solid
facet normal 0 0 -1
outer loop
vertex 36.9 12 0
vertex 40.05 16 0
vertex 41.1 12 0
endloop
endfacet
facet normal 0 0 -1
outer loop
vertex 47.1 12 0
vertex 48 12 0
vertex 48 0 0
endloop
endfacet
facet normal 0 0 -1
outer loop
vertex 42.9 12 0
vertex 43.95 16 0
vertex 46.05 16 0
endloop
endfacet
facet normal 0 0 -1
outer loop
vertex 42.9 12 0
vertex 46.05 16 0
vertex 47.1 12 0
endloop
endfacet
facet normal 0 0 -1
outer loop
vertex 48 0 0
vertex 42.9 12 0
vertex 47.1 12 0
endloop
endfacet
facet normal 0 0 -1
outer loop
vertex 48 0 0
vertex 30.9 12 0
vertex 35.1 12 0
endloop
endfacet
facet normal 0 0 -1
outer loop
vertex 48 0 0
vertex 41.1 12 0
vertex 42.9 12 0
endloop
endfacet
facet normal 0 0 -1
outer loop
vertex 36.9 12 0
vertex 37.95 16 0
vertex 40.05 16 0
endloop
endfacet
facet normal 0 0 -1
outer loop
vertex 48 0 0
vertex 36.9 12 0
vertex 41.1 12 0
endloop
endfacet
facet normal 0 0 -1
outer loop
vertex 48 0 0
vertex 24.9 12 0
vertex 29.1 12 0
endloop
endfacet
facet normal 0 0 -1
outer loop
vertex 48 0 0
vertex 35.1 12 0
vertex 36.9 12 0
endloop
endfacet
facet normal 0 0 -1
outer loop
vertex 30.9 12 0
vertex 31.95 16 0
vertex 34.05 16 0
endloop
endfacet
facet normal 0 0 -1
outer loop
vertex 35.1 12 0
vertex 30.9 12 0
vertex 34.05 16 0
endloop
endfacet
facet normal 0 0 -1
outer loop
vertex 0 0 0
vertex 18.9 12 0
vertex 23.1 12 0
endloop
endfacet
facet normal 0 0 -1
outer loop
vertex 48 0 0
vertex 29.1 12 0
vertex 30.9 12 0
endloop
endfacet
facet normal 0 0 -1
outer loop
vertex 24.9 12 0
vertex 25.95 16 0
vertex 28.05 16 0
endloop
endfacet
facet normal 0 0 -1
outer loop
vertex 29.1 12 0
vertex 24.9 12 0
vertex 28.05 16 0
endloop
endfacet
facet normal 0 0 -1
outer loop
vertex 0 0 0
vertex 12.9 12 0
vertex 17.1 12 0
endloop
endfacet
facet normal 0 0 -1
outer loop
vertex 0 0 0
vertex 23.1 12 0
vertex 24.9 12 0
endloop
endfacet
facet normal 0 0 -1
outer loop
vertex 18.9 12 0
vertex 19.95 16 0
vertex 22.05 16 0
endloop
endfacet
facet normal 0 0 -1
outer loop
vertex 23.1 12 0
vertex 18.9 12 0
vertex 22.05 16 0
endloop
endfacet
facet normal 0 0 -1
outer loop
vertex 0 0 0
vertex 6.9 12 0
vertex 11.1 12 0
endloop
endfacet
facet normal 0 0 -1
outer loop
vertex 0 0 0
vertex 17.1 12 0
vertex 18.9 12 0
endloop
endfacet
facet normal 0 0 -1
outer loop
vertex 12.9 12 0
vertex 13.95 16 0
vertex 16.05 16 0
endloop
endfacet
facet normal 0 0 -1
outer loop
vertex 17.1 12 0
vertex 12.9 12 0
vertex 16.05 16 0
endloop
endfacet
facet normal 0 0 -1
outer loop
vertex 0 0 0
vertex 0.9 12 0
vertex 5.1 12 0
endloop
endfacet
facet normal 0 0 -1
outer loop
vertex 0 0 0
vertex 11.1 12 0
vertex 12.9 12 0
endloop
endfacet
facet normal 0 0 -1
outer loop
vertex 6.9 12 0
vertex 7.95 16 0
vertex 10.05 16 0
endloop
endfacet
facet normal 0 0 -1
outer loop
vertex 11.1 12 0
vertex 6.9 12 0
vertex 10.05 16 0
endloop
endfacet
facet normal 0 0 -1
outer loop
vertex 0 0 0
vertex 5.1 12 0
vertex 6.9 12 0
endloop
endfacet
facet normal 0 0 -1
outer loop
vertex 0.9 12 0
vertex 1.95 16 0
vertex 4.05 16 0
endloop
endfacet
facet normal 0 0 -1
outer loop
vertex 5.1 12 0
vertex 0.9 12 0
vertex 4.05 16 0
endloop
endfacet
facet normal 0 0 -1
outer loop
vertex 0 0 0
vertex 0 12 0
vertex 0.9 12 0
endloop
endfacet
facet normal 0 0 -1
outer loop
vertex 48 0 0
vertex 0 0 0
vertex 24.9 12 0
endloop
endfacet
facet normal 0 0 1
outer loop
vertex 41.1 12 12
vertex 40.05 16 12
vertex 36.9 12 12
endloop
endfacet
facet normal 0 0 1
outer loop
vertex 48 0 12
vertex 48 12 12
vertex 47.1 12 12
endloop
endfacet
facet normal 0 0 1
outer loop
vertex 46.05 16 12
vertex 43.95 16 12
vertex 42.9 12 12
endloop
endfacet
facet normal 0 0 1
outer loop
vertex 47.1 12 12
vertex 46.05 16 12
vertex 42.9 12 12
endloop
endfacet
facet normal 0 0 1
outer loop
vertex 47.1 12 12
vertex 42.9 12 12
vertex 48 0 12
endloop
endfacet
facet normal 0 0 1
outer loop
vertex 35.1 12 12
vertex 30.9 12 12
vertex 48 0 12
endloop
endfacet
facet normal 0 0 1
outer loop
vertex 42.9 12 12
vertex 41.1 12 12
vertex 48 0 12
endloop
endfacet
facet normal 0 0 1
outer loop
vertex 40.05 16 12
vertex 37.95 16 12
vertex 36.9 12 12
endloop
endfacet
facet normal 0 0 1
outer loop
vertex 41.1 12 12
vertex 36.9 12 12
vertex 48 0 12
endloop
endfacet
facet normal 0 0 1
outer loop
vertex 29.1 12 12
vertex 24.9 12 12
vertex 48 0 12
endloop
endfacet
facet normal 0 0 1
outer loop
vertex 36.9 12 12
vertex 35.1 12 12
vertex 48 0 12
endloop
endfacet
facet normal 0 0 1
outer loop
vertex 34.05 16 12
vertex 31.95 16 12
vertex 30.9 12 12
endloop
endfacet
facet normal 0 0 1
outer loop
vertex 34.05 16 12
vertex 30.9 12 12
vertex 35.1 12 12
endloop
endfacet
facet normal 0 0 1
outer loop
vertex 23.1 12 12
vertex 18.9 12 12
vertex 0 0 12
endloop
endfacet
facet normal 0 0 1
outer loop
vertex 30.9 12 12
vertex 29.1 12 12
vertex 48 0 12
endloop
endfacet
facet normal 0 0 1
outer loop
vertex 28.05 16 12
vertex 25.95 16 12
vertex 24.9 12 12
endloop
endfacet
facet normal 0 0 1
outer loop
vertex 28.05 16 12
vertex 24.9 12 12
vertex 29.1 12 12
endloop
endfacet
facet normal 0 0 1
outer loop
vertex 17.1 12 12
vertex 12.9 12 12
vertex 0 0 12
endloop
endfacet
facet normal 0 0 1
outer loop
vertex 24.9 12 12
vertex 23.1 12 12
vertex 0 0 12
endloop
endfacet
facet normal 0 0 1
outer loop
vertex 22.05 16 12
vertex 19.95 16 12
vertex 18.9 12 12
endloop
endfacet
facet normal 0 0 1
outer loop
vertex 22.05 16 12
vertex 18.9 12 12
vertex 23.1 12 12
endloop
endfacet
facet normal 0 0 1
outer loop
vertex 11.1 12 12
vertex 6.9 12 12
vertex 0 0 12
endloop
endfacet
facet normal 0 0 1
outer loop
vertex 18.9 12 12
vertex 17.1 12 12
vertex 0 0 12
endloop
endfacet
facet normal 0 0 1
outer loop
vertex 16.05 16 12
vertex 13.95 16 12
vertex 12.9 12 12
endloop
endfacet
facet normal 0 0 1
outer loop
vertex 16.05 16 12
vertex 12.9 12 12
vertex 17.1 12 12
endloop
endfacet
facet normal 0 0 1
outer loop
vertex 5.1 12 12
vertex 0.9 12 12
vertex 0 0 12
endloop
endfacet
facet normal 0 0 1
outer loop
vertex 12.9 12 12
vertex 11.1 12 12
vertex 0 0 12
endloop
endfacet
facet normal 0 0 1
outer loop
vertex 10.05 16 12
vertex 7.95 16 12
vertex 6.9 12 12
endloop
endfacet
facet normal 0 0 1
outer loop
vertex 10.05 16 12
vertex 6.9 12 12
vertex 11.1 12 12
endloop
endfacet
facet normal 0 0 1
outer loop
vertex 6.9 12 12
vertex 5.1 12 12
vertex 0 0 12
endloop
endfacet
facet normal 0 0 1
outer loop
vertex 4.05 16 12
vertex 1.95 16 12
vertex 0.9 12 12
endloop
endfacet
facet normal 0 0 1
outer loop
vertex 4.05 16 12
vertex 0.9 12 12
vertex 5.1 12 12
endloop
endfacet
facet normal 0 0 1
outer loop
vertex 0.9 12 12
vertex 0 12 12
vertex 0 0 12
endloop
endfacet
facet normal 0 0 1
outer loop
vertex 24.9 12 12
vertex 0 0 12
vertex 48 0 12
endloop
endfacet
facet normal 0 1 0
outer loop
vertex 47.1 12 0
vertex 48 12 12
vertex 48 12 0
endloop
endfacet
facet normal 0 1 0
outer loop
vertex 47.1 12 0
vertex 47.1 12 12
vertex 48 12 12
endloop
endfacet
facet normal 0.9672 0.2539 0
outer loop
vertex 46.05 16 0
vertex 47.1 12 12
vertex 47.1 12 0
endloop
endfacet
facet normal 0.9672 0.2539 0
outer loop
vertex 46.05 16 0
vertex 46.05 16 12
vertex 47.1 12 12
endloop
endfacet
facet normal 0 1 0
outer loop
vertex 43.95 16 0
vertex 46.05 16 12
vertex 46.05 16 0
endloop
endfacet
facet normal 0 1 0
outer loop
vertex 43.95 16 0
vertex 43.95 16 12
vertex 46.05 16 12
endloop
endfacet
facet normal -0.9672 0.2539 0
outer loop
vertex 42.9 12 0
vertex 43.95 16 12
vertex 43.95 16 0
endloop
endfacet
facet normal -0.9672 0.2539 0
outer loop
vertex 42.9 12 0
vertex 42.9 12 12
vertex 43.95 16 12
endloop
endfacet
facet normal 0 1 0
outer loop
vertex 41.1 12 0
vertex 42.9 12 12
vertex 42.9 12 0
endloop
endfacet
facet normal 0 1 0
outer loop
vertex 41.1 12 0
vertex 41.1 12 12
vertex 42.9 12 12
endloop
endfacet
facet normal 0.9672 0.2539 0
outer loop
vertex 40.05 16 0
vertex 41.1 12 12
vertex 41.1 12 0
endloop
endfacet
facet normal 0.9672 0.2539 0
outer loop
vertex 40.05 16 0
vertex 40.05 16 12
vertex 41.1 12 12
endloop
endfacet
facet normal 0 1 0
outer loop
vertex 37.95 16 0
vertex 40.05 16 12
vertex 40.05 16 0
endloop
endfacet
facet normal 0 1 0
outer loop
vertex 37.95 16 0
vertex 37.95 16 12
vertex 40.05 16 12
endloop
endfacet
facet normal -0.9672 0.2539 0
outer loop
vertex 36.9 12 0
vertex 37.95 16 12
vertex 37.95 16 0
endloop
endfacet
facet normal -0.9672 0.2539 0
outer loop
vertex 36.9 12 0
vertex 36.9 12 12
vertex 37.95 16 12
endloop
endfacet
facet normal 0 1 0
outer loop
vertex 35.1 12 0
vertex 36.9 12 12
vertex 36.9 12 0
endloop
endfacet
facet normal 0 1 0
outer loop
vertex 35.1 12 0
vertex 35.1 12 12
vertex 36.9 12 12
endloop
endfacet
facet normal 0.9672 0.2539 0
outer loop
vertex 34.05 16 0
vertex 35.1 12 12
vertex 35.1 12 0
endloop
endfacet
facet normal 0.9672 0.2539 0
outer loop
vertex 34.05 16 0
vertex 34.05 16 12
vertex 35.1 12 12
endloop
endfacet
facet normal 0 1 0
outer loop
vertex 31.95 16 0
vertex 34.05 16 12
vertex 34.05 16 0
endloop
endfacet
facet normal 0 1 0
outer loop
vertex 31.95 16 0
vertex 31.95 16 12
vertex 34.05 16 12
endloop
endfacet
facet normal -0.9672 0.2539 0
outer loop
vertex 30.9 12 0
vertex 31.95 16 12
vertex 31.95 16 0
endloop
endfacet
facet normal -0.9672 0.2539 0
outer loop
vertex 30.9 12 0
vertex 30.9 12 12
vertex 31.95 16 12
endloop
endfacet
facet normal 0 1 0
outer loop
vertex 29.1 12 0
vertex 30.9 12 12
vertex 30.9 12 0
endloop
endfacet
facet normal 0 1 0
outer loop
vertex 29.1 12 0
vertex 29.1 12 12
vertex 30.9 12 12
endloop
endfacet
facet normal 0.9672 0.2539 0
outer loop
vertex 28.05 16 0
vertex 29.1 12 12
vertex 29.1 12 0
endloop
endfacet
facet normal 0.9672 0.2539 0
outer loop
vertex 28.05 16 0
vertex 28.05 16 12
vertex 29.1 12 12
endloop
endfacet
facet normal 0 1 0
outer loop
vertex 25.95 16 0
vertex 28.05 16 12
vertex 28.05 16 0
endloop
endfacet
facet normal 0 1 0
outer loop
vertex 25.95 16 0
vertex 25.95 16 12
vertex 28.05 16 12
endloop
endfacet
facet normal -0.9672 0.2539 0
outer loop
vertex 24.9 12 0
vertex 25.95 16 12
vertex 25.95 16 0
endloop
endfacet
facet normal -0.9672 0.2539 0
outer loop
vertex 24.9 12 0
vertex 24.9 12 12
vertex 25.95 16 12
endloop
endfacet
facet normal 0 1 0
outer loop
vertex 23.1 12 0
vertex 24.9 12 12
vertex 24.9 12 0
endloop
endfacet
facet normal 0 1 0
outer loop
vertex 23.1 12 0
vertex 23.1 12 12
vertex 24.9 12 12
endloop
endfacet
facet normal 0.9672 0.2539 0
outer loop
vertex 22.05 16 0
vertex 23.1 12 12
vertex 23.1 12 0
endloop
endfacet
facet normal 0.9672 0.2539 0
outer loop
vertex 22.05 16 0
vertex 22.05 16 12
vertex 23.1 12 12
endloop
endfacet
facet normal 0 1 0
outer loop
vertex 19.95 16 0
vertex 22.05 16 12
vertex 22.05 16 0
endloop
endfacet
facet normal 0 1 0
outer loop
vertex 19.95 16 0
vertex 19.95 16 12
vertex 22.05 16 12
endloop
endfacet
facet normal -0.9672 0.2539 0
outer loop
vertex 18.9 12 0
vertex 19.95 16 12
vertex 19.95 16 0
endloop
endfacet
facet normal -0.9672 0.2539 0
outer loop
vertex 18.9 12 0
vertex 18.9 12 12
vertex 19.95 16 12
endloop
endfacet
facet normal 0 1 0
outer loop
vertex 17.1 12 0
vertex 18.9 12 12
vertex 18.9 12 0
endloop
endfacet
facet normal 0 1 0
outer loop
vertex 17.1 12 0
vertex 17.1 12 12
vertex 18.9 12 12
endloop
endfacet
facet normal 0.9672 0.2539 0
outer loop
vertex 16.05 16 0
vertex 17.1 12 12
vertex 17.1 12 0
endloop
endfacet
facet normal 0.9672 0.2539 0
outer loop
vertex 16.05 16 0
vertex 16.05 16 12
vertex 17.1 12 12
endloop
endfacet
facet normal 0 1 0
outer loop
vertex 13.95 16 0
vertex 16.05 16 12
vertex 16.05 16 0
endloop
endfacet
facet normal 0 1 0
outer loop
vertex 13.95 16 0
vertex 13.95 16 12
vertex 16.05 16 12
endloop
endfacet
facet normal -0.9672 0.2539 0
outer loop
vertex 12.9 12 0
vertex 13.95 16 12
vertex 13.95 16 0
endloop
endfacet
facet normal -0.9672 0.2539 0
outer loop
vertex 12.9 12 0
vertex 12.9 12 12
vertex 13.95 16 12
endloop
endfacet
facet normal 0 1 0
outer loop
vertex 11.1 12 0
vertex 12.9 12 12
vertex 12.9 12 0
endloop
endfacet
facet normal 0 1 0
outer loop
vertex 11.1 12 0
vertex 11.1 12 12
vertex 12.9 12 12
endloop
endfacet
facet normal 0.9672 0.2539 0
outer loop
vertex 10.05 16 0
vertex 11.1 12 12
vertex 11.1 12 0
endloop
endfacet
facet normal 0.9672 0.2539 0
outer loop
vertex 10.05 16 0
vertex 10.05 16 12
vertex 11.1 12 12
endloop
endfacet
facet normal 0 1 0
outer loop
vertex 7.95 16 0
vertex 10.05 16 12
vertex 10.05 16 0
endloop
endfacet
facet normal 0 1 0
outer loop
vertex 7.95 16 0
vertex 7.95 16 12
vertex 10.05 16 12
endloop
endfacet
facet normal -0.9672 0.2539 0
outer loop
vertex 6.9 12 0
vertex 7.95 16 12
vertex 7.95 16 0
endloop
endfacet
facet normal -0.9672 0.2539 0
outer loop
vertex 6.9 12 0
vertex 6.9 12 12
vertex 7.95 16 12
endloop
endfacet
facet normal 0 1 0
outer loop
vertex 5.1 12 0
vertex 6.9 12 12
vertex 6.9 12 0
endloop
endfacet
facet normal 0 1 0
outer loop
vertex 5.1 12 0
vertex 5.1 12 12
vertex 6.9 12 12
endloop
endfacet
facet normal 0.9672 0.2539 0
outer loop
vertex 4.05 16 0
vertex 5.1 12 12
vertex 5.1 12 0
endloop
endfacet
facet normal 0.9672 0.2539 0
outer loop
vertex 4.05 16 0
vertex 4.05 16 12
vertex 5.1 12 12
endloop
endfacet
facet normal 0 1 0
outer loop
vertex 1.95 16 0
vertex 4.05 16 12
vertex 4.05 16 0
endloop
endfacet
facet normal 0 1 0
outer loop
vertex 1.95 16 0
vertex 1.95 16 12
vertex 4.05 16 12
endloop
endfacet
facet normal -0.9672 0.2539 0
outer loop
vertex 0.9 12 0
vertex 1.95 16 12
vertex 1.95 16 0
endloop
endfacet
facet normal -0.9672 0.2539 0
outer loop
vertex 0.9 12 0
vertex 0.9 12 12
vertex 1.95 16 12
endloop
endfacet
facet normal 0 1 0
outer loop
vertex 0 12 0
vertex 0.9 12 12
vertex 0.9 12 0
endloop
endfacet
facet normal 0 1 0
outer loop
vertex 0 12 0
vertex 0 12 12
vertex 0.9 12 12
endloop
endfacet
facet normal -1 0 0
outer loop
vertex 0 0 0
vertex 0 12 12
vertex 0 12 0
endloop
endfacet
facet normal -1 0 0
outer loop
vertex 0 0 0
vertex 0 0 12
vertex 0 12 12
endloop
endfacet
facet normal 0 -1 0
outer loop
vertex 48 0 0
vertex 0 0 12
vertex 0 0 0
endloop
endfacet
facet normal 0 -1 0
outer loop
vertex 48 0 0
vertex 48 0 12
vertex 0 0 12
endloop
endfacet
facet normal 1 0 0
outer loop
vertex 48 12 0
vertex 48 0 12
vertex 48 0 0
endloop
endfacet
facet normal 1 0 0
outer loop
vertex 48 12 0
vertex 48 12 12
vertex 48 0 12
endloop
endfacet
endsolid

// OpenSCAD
$fn = 32;

// ----------------------------------------------------------------------
// Gear rack: 8 teeth, pitch 6 mm
// ----------------------------------------------------------------------

// --- parameters (mm) ---
teeth = 8;                // number of teeth
pitch = 6;                // tooth pitch, X
root_w = 4.2;             // tooth width at the root
tip_w = 2.1;              // tooth width at the tip
base_h = 12;              // rack body height, Y
tooth_h = 4;              // tooth height above the body
plate_t = 12;             // rack width, Z (extrusion height)

rack_l = teeth * pitch;  // overall length
total_h = base_h + tooth_h;  // overall height

profile = [[0, 0], [48, 0], [48, 12], [47.1, 12], [46.05, 16], [43.95, 16], [42.9, 12], [41.1, 12], [40.05, 16], [37.95, 16], [36.9, 12], [35.1, 12], [34.05, 16], [31.95, 16], [30.9, 12], [29.1, 12], [28.05, 16], [25.95, 16], [24.9, 12], [23.1, 12], [22.05, 16], [19.95, 16], [18.9, 12], [17.1, 12], [16.05, 16], [13.95, 16], [12.9, 12], [11.1, 12], [10.05, 16], [7.95, 16], [6.9, 12], [5.1, 12], [4.05, 16], [1.95, 16], [0.9, 12], [0, 12]];  // primary outline, 36 points, counter clockwise

// --- the one profile operation ---
linear_extrude(height = plate_t) polygon(points = profile);
